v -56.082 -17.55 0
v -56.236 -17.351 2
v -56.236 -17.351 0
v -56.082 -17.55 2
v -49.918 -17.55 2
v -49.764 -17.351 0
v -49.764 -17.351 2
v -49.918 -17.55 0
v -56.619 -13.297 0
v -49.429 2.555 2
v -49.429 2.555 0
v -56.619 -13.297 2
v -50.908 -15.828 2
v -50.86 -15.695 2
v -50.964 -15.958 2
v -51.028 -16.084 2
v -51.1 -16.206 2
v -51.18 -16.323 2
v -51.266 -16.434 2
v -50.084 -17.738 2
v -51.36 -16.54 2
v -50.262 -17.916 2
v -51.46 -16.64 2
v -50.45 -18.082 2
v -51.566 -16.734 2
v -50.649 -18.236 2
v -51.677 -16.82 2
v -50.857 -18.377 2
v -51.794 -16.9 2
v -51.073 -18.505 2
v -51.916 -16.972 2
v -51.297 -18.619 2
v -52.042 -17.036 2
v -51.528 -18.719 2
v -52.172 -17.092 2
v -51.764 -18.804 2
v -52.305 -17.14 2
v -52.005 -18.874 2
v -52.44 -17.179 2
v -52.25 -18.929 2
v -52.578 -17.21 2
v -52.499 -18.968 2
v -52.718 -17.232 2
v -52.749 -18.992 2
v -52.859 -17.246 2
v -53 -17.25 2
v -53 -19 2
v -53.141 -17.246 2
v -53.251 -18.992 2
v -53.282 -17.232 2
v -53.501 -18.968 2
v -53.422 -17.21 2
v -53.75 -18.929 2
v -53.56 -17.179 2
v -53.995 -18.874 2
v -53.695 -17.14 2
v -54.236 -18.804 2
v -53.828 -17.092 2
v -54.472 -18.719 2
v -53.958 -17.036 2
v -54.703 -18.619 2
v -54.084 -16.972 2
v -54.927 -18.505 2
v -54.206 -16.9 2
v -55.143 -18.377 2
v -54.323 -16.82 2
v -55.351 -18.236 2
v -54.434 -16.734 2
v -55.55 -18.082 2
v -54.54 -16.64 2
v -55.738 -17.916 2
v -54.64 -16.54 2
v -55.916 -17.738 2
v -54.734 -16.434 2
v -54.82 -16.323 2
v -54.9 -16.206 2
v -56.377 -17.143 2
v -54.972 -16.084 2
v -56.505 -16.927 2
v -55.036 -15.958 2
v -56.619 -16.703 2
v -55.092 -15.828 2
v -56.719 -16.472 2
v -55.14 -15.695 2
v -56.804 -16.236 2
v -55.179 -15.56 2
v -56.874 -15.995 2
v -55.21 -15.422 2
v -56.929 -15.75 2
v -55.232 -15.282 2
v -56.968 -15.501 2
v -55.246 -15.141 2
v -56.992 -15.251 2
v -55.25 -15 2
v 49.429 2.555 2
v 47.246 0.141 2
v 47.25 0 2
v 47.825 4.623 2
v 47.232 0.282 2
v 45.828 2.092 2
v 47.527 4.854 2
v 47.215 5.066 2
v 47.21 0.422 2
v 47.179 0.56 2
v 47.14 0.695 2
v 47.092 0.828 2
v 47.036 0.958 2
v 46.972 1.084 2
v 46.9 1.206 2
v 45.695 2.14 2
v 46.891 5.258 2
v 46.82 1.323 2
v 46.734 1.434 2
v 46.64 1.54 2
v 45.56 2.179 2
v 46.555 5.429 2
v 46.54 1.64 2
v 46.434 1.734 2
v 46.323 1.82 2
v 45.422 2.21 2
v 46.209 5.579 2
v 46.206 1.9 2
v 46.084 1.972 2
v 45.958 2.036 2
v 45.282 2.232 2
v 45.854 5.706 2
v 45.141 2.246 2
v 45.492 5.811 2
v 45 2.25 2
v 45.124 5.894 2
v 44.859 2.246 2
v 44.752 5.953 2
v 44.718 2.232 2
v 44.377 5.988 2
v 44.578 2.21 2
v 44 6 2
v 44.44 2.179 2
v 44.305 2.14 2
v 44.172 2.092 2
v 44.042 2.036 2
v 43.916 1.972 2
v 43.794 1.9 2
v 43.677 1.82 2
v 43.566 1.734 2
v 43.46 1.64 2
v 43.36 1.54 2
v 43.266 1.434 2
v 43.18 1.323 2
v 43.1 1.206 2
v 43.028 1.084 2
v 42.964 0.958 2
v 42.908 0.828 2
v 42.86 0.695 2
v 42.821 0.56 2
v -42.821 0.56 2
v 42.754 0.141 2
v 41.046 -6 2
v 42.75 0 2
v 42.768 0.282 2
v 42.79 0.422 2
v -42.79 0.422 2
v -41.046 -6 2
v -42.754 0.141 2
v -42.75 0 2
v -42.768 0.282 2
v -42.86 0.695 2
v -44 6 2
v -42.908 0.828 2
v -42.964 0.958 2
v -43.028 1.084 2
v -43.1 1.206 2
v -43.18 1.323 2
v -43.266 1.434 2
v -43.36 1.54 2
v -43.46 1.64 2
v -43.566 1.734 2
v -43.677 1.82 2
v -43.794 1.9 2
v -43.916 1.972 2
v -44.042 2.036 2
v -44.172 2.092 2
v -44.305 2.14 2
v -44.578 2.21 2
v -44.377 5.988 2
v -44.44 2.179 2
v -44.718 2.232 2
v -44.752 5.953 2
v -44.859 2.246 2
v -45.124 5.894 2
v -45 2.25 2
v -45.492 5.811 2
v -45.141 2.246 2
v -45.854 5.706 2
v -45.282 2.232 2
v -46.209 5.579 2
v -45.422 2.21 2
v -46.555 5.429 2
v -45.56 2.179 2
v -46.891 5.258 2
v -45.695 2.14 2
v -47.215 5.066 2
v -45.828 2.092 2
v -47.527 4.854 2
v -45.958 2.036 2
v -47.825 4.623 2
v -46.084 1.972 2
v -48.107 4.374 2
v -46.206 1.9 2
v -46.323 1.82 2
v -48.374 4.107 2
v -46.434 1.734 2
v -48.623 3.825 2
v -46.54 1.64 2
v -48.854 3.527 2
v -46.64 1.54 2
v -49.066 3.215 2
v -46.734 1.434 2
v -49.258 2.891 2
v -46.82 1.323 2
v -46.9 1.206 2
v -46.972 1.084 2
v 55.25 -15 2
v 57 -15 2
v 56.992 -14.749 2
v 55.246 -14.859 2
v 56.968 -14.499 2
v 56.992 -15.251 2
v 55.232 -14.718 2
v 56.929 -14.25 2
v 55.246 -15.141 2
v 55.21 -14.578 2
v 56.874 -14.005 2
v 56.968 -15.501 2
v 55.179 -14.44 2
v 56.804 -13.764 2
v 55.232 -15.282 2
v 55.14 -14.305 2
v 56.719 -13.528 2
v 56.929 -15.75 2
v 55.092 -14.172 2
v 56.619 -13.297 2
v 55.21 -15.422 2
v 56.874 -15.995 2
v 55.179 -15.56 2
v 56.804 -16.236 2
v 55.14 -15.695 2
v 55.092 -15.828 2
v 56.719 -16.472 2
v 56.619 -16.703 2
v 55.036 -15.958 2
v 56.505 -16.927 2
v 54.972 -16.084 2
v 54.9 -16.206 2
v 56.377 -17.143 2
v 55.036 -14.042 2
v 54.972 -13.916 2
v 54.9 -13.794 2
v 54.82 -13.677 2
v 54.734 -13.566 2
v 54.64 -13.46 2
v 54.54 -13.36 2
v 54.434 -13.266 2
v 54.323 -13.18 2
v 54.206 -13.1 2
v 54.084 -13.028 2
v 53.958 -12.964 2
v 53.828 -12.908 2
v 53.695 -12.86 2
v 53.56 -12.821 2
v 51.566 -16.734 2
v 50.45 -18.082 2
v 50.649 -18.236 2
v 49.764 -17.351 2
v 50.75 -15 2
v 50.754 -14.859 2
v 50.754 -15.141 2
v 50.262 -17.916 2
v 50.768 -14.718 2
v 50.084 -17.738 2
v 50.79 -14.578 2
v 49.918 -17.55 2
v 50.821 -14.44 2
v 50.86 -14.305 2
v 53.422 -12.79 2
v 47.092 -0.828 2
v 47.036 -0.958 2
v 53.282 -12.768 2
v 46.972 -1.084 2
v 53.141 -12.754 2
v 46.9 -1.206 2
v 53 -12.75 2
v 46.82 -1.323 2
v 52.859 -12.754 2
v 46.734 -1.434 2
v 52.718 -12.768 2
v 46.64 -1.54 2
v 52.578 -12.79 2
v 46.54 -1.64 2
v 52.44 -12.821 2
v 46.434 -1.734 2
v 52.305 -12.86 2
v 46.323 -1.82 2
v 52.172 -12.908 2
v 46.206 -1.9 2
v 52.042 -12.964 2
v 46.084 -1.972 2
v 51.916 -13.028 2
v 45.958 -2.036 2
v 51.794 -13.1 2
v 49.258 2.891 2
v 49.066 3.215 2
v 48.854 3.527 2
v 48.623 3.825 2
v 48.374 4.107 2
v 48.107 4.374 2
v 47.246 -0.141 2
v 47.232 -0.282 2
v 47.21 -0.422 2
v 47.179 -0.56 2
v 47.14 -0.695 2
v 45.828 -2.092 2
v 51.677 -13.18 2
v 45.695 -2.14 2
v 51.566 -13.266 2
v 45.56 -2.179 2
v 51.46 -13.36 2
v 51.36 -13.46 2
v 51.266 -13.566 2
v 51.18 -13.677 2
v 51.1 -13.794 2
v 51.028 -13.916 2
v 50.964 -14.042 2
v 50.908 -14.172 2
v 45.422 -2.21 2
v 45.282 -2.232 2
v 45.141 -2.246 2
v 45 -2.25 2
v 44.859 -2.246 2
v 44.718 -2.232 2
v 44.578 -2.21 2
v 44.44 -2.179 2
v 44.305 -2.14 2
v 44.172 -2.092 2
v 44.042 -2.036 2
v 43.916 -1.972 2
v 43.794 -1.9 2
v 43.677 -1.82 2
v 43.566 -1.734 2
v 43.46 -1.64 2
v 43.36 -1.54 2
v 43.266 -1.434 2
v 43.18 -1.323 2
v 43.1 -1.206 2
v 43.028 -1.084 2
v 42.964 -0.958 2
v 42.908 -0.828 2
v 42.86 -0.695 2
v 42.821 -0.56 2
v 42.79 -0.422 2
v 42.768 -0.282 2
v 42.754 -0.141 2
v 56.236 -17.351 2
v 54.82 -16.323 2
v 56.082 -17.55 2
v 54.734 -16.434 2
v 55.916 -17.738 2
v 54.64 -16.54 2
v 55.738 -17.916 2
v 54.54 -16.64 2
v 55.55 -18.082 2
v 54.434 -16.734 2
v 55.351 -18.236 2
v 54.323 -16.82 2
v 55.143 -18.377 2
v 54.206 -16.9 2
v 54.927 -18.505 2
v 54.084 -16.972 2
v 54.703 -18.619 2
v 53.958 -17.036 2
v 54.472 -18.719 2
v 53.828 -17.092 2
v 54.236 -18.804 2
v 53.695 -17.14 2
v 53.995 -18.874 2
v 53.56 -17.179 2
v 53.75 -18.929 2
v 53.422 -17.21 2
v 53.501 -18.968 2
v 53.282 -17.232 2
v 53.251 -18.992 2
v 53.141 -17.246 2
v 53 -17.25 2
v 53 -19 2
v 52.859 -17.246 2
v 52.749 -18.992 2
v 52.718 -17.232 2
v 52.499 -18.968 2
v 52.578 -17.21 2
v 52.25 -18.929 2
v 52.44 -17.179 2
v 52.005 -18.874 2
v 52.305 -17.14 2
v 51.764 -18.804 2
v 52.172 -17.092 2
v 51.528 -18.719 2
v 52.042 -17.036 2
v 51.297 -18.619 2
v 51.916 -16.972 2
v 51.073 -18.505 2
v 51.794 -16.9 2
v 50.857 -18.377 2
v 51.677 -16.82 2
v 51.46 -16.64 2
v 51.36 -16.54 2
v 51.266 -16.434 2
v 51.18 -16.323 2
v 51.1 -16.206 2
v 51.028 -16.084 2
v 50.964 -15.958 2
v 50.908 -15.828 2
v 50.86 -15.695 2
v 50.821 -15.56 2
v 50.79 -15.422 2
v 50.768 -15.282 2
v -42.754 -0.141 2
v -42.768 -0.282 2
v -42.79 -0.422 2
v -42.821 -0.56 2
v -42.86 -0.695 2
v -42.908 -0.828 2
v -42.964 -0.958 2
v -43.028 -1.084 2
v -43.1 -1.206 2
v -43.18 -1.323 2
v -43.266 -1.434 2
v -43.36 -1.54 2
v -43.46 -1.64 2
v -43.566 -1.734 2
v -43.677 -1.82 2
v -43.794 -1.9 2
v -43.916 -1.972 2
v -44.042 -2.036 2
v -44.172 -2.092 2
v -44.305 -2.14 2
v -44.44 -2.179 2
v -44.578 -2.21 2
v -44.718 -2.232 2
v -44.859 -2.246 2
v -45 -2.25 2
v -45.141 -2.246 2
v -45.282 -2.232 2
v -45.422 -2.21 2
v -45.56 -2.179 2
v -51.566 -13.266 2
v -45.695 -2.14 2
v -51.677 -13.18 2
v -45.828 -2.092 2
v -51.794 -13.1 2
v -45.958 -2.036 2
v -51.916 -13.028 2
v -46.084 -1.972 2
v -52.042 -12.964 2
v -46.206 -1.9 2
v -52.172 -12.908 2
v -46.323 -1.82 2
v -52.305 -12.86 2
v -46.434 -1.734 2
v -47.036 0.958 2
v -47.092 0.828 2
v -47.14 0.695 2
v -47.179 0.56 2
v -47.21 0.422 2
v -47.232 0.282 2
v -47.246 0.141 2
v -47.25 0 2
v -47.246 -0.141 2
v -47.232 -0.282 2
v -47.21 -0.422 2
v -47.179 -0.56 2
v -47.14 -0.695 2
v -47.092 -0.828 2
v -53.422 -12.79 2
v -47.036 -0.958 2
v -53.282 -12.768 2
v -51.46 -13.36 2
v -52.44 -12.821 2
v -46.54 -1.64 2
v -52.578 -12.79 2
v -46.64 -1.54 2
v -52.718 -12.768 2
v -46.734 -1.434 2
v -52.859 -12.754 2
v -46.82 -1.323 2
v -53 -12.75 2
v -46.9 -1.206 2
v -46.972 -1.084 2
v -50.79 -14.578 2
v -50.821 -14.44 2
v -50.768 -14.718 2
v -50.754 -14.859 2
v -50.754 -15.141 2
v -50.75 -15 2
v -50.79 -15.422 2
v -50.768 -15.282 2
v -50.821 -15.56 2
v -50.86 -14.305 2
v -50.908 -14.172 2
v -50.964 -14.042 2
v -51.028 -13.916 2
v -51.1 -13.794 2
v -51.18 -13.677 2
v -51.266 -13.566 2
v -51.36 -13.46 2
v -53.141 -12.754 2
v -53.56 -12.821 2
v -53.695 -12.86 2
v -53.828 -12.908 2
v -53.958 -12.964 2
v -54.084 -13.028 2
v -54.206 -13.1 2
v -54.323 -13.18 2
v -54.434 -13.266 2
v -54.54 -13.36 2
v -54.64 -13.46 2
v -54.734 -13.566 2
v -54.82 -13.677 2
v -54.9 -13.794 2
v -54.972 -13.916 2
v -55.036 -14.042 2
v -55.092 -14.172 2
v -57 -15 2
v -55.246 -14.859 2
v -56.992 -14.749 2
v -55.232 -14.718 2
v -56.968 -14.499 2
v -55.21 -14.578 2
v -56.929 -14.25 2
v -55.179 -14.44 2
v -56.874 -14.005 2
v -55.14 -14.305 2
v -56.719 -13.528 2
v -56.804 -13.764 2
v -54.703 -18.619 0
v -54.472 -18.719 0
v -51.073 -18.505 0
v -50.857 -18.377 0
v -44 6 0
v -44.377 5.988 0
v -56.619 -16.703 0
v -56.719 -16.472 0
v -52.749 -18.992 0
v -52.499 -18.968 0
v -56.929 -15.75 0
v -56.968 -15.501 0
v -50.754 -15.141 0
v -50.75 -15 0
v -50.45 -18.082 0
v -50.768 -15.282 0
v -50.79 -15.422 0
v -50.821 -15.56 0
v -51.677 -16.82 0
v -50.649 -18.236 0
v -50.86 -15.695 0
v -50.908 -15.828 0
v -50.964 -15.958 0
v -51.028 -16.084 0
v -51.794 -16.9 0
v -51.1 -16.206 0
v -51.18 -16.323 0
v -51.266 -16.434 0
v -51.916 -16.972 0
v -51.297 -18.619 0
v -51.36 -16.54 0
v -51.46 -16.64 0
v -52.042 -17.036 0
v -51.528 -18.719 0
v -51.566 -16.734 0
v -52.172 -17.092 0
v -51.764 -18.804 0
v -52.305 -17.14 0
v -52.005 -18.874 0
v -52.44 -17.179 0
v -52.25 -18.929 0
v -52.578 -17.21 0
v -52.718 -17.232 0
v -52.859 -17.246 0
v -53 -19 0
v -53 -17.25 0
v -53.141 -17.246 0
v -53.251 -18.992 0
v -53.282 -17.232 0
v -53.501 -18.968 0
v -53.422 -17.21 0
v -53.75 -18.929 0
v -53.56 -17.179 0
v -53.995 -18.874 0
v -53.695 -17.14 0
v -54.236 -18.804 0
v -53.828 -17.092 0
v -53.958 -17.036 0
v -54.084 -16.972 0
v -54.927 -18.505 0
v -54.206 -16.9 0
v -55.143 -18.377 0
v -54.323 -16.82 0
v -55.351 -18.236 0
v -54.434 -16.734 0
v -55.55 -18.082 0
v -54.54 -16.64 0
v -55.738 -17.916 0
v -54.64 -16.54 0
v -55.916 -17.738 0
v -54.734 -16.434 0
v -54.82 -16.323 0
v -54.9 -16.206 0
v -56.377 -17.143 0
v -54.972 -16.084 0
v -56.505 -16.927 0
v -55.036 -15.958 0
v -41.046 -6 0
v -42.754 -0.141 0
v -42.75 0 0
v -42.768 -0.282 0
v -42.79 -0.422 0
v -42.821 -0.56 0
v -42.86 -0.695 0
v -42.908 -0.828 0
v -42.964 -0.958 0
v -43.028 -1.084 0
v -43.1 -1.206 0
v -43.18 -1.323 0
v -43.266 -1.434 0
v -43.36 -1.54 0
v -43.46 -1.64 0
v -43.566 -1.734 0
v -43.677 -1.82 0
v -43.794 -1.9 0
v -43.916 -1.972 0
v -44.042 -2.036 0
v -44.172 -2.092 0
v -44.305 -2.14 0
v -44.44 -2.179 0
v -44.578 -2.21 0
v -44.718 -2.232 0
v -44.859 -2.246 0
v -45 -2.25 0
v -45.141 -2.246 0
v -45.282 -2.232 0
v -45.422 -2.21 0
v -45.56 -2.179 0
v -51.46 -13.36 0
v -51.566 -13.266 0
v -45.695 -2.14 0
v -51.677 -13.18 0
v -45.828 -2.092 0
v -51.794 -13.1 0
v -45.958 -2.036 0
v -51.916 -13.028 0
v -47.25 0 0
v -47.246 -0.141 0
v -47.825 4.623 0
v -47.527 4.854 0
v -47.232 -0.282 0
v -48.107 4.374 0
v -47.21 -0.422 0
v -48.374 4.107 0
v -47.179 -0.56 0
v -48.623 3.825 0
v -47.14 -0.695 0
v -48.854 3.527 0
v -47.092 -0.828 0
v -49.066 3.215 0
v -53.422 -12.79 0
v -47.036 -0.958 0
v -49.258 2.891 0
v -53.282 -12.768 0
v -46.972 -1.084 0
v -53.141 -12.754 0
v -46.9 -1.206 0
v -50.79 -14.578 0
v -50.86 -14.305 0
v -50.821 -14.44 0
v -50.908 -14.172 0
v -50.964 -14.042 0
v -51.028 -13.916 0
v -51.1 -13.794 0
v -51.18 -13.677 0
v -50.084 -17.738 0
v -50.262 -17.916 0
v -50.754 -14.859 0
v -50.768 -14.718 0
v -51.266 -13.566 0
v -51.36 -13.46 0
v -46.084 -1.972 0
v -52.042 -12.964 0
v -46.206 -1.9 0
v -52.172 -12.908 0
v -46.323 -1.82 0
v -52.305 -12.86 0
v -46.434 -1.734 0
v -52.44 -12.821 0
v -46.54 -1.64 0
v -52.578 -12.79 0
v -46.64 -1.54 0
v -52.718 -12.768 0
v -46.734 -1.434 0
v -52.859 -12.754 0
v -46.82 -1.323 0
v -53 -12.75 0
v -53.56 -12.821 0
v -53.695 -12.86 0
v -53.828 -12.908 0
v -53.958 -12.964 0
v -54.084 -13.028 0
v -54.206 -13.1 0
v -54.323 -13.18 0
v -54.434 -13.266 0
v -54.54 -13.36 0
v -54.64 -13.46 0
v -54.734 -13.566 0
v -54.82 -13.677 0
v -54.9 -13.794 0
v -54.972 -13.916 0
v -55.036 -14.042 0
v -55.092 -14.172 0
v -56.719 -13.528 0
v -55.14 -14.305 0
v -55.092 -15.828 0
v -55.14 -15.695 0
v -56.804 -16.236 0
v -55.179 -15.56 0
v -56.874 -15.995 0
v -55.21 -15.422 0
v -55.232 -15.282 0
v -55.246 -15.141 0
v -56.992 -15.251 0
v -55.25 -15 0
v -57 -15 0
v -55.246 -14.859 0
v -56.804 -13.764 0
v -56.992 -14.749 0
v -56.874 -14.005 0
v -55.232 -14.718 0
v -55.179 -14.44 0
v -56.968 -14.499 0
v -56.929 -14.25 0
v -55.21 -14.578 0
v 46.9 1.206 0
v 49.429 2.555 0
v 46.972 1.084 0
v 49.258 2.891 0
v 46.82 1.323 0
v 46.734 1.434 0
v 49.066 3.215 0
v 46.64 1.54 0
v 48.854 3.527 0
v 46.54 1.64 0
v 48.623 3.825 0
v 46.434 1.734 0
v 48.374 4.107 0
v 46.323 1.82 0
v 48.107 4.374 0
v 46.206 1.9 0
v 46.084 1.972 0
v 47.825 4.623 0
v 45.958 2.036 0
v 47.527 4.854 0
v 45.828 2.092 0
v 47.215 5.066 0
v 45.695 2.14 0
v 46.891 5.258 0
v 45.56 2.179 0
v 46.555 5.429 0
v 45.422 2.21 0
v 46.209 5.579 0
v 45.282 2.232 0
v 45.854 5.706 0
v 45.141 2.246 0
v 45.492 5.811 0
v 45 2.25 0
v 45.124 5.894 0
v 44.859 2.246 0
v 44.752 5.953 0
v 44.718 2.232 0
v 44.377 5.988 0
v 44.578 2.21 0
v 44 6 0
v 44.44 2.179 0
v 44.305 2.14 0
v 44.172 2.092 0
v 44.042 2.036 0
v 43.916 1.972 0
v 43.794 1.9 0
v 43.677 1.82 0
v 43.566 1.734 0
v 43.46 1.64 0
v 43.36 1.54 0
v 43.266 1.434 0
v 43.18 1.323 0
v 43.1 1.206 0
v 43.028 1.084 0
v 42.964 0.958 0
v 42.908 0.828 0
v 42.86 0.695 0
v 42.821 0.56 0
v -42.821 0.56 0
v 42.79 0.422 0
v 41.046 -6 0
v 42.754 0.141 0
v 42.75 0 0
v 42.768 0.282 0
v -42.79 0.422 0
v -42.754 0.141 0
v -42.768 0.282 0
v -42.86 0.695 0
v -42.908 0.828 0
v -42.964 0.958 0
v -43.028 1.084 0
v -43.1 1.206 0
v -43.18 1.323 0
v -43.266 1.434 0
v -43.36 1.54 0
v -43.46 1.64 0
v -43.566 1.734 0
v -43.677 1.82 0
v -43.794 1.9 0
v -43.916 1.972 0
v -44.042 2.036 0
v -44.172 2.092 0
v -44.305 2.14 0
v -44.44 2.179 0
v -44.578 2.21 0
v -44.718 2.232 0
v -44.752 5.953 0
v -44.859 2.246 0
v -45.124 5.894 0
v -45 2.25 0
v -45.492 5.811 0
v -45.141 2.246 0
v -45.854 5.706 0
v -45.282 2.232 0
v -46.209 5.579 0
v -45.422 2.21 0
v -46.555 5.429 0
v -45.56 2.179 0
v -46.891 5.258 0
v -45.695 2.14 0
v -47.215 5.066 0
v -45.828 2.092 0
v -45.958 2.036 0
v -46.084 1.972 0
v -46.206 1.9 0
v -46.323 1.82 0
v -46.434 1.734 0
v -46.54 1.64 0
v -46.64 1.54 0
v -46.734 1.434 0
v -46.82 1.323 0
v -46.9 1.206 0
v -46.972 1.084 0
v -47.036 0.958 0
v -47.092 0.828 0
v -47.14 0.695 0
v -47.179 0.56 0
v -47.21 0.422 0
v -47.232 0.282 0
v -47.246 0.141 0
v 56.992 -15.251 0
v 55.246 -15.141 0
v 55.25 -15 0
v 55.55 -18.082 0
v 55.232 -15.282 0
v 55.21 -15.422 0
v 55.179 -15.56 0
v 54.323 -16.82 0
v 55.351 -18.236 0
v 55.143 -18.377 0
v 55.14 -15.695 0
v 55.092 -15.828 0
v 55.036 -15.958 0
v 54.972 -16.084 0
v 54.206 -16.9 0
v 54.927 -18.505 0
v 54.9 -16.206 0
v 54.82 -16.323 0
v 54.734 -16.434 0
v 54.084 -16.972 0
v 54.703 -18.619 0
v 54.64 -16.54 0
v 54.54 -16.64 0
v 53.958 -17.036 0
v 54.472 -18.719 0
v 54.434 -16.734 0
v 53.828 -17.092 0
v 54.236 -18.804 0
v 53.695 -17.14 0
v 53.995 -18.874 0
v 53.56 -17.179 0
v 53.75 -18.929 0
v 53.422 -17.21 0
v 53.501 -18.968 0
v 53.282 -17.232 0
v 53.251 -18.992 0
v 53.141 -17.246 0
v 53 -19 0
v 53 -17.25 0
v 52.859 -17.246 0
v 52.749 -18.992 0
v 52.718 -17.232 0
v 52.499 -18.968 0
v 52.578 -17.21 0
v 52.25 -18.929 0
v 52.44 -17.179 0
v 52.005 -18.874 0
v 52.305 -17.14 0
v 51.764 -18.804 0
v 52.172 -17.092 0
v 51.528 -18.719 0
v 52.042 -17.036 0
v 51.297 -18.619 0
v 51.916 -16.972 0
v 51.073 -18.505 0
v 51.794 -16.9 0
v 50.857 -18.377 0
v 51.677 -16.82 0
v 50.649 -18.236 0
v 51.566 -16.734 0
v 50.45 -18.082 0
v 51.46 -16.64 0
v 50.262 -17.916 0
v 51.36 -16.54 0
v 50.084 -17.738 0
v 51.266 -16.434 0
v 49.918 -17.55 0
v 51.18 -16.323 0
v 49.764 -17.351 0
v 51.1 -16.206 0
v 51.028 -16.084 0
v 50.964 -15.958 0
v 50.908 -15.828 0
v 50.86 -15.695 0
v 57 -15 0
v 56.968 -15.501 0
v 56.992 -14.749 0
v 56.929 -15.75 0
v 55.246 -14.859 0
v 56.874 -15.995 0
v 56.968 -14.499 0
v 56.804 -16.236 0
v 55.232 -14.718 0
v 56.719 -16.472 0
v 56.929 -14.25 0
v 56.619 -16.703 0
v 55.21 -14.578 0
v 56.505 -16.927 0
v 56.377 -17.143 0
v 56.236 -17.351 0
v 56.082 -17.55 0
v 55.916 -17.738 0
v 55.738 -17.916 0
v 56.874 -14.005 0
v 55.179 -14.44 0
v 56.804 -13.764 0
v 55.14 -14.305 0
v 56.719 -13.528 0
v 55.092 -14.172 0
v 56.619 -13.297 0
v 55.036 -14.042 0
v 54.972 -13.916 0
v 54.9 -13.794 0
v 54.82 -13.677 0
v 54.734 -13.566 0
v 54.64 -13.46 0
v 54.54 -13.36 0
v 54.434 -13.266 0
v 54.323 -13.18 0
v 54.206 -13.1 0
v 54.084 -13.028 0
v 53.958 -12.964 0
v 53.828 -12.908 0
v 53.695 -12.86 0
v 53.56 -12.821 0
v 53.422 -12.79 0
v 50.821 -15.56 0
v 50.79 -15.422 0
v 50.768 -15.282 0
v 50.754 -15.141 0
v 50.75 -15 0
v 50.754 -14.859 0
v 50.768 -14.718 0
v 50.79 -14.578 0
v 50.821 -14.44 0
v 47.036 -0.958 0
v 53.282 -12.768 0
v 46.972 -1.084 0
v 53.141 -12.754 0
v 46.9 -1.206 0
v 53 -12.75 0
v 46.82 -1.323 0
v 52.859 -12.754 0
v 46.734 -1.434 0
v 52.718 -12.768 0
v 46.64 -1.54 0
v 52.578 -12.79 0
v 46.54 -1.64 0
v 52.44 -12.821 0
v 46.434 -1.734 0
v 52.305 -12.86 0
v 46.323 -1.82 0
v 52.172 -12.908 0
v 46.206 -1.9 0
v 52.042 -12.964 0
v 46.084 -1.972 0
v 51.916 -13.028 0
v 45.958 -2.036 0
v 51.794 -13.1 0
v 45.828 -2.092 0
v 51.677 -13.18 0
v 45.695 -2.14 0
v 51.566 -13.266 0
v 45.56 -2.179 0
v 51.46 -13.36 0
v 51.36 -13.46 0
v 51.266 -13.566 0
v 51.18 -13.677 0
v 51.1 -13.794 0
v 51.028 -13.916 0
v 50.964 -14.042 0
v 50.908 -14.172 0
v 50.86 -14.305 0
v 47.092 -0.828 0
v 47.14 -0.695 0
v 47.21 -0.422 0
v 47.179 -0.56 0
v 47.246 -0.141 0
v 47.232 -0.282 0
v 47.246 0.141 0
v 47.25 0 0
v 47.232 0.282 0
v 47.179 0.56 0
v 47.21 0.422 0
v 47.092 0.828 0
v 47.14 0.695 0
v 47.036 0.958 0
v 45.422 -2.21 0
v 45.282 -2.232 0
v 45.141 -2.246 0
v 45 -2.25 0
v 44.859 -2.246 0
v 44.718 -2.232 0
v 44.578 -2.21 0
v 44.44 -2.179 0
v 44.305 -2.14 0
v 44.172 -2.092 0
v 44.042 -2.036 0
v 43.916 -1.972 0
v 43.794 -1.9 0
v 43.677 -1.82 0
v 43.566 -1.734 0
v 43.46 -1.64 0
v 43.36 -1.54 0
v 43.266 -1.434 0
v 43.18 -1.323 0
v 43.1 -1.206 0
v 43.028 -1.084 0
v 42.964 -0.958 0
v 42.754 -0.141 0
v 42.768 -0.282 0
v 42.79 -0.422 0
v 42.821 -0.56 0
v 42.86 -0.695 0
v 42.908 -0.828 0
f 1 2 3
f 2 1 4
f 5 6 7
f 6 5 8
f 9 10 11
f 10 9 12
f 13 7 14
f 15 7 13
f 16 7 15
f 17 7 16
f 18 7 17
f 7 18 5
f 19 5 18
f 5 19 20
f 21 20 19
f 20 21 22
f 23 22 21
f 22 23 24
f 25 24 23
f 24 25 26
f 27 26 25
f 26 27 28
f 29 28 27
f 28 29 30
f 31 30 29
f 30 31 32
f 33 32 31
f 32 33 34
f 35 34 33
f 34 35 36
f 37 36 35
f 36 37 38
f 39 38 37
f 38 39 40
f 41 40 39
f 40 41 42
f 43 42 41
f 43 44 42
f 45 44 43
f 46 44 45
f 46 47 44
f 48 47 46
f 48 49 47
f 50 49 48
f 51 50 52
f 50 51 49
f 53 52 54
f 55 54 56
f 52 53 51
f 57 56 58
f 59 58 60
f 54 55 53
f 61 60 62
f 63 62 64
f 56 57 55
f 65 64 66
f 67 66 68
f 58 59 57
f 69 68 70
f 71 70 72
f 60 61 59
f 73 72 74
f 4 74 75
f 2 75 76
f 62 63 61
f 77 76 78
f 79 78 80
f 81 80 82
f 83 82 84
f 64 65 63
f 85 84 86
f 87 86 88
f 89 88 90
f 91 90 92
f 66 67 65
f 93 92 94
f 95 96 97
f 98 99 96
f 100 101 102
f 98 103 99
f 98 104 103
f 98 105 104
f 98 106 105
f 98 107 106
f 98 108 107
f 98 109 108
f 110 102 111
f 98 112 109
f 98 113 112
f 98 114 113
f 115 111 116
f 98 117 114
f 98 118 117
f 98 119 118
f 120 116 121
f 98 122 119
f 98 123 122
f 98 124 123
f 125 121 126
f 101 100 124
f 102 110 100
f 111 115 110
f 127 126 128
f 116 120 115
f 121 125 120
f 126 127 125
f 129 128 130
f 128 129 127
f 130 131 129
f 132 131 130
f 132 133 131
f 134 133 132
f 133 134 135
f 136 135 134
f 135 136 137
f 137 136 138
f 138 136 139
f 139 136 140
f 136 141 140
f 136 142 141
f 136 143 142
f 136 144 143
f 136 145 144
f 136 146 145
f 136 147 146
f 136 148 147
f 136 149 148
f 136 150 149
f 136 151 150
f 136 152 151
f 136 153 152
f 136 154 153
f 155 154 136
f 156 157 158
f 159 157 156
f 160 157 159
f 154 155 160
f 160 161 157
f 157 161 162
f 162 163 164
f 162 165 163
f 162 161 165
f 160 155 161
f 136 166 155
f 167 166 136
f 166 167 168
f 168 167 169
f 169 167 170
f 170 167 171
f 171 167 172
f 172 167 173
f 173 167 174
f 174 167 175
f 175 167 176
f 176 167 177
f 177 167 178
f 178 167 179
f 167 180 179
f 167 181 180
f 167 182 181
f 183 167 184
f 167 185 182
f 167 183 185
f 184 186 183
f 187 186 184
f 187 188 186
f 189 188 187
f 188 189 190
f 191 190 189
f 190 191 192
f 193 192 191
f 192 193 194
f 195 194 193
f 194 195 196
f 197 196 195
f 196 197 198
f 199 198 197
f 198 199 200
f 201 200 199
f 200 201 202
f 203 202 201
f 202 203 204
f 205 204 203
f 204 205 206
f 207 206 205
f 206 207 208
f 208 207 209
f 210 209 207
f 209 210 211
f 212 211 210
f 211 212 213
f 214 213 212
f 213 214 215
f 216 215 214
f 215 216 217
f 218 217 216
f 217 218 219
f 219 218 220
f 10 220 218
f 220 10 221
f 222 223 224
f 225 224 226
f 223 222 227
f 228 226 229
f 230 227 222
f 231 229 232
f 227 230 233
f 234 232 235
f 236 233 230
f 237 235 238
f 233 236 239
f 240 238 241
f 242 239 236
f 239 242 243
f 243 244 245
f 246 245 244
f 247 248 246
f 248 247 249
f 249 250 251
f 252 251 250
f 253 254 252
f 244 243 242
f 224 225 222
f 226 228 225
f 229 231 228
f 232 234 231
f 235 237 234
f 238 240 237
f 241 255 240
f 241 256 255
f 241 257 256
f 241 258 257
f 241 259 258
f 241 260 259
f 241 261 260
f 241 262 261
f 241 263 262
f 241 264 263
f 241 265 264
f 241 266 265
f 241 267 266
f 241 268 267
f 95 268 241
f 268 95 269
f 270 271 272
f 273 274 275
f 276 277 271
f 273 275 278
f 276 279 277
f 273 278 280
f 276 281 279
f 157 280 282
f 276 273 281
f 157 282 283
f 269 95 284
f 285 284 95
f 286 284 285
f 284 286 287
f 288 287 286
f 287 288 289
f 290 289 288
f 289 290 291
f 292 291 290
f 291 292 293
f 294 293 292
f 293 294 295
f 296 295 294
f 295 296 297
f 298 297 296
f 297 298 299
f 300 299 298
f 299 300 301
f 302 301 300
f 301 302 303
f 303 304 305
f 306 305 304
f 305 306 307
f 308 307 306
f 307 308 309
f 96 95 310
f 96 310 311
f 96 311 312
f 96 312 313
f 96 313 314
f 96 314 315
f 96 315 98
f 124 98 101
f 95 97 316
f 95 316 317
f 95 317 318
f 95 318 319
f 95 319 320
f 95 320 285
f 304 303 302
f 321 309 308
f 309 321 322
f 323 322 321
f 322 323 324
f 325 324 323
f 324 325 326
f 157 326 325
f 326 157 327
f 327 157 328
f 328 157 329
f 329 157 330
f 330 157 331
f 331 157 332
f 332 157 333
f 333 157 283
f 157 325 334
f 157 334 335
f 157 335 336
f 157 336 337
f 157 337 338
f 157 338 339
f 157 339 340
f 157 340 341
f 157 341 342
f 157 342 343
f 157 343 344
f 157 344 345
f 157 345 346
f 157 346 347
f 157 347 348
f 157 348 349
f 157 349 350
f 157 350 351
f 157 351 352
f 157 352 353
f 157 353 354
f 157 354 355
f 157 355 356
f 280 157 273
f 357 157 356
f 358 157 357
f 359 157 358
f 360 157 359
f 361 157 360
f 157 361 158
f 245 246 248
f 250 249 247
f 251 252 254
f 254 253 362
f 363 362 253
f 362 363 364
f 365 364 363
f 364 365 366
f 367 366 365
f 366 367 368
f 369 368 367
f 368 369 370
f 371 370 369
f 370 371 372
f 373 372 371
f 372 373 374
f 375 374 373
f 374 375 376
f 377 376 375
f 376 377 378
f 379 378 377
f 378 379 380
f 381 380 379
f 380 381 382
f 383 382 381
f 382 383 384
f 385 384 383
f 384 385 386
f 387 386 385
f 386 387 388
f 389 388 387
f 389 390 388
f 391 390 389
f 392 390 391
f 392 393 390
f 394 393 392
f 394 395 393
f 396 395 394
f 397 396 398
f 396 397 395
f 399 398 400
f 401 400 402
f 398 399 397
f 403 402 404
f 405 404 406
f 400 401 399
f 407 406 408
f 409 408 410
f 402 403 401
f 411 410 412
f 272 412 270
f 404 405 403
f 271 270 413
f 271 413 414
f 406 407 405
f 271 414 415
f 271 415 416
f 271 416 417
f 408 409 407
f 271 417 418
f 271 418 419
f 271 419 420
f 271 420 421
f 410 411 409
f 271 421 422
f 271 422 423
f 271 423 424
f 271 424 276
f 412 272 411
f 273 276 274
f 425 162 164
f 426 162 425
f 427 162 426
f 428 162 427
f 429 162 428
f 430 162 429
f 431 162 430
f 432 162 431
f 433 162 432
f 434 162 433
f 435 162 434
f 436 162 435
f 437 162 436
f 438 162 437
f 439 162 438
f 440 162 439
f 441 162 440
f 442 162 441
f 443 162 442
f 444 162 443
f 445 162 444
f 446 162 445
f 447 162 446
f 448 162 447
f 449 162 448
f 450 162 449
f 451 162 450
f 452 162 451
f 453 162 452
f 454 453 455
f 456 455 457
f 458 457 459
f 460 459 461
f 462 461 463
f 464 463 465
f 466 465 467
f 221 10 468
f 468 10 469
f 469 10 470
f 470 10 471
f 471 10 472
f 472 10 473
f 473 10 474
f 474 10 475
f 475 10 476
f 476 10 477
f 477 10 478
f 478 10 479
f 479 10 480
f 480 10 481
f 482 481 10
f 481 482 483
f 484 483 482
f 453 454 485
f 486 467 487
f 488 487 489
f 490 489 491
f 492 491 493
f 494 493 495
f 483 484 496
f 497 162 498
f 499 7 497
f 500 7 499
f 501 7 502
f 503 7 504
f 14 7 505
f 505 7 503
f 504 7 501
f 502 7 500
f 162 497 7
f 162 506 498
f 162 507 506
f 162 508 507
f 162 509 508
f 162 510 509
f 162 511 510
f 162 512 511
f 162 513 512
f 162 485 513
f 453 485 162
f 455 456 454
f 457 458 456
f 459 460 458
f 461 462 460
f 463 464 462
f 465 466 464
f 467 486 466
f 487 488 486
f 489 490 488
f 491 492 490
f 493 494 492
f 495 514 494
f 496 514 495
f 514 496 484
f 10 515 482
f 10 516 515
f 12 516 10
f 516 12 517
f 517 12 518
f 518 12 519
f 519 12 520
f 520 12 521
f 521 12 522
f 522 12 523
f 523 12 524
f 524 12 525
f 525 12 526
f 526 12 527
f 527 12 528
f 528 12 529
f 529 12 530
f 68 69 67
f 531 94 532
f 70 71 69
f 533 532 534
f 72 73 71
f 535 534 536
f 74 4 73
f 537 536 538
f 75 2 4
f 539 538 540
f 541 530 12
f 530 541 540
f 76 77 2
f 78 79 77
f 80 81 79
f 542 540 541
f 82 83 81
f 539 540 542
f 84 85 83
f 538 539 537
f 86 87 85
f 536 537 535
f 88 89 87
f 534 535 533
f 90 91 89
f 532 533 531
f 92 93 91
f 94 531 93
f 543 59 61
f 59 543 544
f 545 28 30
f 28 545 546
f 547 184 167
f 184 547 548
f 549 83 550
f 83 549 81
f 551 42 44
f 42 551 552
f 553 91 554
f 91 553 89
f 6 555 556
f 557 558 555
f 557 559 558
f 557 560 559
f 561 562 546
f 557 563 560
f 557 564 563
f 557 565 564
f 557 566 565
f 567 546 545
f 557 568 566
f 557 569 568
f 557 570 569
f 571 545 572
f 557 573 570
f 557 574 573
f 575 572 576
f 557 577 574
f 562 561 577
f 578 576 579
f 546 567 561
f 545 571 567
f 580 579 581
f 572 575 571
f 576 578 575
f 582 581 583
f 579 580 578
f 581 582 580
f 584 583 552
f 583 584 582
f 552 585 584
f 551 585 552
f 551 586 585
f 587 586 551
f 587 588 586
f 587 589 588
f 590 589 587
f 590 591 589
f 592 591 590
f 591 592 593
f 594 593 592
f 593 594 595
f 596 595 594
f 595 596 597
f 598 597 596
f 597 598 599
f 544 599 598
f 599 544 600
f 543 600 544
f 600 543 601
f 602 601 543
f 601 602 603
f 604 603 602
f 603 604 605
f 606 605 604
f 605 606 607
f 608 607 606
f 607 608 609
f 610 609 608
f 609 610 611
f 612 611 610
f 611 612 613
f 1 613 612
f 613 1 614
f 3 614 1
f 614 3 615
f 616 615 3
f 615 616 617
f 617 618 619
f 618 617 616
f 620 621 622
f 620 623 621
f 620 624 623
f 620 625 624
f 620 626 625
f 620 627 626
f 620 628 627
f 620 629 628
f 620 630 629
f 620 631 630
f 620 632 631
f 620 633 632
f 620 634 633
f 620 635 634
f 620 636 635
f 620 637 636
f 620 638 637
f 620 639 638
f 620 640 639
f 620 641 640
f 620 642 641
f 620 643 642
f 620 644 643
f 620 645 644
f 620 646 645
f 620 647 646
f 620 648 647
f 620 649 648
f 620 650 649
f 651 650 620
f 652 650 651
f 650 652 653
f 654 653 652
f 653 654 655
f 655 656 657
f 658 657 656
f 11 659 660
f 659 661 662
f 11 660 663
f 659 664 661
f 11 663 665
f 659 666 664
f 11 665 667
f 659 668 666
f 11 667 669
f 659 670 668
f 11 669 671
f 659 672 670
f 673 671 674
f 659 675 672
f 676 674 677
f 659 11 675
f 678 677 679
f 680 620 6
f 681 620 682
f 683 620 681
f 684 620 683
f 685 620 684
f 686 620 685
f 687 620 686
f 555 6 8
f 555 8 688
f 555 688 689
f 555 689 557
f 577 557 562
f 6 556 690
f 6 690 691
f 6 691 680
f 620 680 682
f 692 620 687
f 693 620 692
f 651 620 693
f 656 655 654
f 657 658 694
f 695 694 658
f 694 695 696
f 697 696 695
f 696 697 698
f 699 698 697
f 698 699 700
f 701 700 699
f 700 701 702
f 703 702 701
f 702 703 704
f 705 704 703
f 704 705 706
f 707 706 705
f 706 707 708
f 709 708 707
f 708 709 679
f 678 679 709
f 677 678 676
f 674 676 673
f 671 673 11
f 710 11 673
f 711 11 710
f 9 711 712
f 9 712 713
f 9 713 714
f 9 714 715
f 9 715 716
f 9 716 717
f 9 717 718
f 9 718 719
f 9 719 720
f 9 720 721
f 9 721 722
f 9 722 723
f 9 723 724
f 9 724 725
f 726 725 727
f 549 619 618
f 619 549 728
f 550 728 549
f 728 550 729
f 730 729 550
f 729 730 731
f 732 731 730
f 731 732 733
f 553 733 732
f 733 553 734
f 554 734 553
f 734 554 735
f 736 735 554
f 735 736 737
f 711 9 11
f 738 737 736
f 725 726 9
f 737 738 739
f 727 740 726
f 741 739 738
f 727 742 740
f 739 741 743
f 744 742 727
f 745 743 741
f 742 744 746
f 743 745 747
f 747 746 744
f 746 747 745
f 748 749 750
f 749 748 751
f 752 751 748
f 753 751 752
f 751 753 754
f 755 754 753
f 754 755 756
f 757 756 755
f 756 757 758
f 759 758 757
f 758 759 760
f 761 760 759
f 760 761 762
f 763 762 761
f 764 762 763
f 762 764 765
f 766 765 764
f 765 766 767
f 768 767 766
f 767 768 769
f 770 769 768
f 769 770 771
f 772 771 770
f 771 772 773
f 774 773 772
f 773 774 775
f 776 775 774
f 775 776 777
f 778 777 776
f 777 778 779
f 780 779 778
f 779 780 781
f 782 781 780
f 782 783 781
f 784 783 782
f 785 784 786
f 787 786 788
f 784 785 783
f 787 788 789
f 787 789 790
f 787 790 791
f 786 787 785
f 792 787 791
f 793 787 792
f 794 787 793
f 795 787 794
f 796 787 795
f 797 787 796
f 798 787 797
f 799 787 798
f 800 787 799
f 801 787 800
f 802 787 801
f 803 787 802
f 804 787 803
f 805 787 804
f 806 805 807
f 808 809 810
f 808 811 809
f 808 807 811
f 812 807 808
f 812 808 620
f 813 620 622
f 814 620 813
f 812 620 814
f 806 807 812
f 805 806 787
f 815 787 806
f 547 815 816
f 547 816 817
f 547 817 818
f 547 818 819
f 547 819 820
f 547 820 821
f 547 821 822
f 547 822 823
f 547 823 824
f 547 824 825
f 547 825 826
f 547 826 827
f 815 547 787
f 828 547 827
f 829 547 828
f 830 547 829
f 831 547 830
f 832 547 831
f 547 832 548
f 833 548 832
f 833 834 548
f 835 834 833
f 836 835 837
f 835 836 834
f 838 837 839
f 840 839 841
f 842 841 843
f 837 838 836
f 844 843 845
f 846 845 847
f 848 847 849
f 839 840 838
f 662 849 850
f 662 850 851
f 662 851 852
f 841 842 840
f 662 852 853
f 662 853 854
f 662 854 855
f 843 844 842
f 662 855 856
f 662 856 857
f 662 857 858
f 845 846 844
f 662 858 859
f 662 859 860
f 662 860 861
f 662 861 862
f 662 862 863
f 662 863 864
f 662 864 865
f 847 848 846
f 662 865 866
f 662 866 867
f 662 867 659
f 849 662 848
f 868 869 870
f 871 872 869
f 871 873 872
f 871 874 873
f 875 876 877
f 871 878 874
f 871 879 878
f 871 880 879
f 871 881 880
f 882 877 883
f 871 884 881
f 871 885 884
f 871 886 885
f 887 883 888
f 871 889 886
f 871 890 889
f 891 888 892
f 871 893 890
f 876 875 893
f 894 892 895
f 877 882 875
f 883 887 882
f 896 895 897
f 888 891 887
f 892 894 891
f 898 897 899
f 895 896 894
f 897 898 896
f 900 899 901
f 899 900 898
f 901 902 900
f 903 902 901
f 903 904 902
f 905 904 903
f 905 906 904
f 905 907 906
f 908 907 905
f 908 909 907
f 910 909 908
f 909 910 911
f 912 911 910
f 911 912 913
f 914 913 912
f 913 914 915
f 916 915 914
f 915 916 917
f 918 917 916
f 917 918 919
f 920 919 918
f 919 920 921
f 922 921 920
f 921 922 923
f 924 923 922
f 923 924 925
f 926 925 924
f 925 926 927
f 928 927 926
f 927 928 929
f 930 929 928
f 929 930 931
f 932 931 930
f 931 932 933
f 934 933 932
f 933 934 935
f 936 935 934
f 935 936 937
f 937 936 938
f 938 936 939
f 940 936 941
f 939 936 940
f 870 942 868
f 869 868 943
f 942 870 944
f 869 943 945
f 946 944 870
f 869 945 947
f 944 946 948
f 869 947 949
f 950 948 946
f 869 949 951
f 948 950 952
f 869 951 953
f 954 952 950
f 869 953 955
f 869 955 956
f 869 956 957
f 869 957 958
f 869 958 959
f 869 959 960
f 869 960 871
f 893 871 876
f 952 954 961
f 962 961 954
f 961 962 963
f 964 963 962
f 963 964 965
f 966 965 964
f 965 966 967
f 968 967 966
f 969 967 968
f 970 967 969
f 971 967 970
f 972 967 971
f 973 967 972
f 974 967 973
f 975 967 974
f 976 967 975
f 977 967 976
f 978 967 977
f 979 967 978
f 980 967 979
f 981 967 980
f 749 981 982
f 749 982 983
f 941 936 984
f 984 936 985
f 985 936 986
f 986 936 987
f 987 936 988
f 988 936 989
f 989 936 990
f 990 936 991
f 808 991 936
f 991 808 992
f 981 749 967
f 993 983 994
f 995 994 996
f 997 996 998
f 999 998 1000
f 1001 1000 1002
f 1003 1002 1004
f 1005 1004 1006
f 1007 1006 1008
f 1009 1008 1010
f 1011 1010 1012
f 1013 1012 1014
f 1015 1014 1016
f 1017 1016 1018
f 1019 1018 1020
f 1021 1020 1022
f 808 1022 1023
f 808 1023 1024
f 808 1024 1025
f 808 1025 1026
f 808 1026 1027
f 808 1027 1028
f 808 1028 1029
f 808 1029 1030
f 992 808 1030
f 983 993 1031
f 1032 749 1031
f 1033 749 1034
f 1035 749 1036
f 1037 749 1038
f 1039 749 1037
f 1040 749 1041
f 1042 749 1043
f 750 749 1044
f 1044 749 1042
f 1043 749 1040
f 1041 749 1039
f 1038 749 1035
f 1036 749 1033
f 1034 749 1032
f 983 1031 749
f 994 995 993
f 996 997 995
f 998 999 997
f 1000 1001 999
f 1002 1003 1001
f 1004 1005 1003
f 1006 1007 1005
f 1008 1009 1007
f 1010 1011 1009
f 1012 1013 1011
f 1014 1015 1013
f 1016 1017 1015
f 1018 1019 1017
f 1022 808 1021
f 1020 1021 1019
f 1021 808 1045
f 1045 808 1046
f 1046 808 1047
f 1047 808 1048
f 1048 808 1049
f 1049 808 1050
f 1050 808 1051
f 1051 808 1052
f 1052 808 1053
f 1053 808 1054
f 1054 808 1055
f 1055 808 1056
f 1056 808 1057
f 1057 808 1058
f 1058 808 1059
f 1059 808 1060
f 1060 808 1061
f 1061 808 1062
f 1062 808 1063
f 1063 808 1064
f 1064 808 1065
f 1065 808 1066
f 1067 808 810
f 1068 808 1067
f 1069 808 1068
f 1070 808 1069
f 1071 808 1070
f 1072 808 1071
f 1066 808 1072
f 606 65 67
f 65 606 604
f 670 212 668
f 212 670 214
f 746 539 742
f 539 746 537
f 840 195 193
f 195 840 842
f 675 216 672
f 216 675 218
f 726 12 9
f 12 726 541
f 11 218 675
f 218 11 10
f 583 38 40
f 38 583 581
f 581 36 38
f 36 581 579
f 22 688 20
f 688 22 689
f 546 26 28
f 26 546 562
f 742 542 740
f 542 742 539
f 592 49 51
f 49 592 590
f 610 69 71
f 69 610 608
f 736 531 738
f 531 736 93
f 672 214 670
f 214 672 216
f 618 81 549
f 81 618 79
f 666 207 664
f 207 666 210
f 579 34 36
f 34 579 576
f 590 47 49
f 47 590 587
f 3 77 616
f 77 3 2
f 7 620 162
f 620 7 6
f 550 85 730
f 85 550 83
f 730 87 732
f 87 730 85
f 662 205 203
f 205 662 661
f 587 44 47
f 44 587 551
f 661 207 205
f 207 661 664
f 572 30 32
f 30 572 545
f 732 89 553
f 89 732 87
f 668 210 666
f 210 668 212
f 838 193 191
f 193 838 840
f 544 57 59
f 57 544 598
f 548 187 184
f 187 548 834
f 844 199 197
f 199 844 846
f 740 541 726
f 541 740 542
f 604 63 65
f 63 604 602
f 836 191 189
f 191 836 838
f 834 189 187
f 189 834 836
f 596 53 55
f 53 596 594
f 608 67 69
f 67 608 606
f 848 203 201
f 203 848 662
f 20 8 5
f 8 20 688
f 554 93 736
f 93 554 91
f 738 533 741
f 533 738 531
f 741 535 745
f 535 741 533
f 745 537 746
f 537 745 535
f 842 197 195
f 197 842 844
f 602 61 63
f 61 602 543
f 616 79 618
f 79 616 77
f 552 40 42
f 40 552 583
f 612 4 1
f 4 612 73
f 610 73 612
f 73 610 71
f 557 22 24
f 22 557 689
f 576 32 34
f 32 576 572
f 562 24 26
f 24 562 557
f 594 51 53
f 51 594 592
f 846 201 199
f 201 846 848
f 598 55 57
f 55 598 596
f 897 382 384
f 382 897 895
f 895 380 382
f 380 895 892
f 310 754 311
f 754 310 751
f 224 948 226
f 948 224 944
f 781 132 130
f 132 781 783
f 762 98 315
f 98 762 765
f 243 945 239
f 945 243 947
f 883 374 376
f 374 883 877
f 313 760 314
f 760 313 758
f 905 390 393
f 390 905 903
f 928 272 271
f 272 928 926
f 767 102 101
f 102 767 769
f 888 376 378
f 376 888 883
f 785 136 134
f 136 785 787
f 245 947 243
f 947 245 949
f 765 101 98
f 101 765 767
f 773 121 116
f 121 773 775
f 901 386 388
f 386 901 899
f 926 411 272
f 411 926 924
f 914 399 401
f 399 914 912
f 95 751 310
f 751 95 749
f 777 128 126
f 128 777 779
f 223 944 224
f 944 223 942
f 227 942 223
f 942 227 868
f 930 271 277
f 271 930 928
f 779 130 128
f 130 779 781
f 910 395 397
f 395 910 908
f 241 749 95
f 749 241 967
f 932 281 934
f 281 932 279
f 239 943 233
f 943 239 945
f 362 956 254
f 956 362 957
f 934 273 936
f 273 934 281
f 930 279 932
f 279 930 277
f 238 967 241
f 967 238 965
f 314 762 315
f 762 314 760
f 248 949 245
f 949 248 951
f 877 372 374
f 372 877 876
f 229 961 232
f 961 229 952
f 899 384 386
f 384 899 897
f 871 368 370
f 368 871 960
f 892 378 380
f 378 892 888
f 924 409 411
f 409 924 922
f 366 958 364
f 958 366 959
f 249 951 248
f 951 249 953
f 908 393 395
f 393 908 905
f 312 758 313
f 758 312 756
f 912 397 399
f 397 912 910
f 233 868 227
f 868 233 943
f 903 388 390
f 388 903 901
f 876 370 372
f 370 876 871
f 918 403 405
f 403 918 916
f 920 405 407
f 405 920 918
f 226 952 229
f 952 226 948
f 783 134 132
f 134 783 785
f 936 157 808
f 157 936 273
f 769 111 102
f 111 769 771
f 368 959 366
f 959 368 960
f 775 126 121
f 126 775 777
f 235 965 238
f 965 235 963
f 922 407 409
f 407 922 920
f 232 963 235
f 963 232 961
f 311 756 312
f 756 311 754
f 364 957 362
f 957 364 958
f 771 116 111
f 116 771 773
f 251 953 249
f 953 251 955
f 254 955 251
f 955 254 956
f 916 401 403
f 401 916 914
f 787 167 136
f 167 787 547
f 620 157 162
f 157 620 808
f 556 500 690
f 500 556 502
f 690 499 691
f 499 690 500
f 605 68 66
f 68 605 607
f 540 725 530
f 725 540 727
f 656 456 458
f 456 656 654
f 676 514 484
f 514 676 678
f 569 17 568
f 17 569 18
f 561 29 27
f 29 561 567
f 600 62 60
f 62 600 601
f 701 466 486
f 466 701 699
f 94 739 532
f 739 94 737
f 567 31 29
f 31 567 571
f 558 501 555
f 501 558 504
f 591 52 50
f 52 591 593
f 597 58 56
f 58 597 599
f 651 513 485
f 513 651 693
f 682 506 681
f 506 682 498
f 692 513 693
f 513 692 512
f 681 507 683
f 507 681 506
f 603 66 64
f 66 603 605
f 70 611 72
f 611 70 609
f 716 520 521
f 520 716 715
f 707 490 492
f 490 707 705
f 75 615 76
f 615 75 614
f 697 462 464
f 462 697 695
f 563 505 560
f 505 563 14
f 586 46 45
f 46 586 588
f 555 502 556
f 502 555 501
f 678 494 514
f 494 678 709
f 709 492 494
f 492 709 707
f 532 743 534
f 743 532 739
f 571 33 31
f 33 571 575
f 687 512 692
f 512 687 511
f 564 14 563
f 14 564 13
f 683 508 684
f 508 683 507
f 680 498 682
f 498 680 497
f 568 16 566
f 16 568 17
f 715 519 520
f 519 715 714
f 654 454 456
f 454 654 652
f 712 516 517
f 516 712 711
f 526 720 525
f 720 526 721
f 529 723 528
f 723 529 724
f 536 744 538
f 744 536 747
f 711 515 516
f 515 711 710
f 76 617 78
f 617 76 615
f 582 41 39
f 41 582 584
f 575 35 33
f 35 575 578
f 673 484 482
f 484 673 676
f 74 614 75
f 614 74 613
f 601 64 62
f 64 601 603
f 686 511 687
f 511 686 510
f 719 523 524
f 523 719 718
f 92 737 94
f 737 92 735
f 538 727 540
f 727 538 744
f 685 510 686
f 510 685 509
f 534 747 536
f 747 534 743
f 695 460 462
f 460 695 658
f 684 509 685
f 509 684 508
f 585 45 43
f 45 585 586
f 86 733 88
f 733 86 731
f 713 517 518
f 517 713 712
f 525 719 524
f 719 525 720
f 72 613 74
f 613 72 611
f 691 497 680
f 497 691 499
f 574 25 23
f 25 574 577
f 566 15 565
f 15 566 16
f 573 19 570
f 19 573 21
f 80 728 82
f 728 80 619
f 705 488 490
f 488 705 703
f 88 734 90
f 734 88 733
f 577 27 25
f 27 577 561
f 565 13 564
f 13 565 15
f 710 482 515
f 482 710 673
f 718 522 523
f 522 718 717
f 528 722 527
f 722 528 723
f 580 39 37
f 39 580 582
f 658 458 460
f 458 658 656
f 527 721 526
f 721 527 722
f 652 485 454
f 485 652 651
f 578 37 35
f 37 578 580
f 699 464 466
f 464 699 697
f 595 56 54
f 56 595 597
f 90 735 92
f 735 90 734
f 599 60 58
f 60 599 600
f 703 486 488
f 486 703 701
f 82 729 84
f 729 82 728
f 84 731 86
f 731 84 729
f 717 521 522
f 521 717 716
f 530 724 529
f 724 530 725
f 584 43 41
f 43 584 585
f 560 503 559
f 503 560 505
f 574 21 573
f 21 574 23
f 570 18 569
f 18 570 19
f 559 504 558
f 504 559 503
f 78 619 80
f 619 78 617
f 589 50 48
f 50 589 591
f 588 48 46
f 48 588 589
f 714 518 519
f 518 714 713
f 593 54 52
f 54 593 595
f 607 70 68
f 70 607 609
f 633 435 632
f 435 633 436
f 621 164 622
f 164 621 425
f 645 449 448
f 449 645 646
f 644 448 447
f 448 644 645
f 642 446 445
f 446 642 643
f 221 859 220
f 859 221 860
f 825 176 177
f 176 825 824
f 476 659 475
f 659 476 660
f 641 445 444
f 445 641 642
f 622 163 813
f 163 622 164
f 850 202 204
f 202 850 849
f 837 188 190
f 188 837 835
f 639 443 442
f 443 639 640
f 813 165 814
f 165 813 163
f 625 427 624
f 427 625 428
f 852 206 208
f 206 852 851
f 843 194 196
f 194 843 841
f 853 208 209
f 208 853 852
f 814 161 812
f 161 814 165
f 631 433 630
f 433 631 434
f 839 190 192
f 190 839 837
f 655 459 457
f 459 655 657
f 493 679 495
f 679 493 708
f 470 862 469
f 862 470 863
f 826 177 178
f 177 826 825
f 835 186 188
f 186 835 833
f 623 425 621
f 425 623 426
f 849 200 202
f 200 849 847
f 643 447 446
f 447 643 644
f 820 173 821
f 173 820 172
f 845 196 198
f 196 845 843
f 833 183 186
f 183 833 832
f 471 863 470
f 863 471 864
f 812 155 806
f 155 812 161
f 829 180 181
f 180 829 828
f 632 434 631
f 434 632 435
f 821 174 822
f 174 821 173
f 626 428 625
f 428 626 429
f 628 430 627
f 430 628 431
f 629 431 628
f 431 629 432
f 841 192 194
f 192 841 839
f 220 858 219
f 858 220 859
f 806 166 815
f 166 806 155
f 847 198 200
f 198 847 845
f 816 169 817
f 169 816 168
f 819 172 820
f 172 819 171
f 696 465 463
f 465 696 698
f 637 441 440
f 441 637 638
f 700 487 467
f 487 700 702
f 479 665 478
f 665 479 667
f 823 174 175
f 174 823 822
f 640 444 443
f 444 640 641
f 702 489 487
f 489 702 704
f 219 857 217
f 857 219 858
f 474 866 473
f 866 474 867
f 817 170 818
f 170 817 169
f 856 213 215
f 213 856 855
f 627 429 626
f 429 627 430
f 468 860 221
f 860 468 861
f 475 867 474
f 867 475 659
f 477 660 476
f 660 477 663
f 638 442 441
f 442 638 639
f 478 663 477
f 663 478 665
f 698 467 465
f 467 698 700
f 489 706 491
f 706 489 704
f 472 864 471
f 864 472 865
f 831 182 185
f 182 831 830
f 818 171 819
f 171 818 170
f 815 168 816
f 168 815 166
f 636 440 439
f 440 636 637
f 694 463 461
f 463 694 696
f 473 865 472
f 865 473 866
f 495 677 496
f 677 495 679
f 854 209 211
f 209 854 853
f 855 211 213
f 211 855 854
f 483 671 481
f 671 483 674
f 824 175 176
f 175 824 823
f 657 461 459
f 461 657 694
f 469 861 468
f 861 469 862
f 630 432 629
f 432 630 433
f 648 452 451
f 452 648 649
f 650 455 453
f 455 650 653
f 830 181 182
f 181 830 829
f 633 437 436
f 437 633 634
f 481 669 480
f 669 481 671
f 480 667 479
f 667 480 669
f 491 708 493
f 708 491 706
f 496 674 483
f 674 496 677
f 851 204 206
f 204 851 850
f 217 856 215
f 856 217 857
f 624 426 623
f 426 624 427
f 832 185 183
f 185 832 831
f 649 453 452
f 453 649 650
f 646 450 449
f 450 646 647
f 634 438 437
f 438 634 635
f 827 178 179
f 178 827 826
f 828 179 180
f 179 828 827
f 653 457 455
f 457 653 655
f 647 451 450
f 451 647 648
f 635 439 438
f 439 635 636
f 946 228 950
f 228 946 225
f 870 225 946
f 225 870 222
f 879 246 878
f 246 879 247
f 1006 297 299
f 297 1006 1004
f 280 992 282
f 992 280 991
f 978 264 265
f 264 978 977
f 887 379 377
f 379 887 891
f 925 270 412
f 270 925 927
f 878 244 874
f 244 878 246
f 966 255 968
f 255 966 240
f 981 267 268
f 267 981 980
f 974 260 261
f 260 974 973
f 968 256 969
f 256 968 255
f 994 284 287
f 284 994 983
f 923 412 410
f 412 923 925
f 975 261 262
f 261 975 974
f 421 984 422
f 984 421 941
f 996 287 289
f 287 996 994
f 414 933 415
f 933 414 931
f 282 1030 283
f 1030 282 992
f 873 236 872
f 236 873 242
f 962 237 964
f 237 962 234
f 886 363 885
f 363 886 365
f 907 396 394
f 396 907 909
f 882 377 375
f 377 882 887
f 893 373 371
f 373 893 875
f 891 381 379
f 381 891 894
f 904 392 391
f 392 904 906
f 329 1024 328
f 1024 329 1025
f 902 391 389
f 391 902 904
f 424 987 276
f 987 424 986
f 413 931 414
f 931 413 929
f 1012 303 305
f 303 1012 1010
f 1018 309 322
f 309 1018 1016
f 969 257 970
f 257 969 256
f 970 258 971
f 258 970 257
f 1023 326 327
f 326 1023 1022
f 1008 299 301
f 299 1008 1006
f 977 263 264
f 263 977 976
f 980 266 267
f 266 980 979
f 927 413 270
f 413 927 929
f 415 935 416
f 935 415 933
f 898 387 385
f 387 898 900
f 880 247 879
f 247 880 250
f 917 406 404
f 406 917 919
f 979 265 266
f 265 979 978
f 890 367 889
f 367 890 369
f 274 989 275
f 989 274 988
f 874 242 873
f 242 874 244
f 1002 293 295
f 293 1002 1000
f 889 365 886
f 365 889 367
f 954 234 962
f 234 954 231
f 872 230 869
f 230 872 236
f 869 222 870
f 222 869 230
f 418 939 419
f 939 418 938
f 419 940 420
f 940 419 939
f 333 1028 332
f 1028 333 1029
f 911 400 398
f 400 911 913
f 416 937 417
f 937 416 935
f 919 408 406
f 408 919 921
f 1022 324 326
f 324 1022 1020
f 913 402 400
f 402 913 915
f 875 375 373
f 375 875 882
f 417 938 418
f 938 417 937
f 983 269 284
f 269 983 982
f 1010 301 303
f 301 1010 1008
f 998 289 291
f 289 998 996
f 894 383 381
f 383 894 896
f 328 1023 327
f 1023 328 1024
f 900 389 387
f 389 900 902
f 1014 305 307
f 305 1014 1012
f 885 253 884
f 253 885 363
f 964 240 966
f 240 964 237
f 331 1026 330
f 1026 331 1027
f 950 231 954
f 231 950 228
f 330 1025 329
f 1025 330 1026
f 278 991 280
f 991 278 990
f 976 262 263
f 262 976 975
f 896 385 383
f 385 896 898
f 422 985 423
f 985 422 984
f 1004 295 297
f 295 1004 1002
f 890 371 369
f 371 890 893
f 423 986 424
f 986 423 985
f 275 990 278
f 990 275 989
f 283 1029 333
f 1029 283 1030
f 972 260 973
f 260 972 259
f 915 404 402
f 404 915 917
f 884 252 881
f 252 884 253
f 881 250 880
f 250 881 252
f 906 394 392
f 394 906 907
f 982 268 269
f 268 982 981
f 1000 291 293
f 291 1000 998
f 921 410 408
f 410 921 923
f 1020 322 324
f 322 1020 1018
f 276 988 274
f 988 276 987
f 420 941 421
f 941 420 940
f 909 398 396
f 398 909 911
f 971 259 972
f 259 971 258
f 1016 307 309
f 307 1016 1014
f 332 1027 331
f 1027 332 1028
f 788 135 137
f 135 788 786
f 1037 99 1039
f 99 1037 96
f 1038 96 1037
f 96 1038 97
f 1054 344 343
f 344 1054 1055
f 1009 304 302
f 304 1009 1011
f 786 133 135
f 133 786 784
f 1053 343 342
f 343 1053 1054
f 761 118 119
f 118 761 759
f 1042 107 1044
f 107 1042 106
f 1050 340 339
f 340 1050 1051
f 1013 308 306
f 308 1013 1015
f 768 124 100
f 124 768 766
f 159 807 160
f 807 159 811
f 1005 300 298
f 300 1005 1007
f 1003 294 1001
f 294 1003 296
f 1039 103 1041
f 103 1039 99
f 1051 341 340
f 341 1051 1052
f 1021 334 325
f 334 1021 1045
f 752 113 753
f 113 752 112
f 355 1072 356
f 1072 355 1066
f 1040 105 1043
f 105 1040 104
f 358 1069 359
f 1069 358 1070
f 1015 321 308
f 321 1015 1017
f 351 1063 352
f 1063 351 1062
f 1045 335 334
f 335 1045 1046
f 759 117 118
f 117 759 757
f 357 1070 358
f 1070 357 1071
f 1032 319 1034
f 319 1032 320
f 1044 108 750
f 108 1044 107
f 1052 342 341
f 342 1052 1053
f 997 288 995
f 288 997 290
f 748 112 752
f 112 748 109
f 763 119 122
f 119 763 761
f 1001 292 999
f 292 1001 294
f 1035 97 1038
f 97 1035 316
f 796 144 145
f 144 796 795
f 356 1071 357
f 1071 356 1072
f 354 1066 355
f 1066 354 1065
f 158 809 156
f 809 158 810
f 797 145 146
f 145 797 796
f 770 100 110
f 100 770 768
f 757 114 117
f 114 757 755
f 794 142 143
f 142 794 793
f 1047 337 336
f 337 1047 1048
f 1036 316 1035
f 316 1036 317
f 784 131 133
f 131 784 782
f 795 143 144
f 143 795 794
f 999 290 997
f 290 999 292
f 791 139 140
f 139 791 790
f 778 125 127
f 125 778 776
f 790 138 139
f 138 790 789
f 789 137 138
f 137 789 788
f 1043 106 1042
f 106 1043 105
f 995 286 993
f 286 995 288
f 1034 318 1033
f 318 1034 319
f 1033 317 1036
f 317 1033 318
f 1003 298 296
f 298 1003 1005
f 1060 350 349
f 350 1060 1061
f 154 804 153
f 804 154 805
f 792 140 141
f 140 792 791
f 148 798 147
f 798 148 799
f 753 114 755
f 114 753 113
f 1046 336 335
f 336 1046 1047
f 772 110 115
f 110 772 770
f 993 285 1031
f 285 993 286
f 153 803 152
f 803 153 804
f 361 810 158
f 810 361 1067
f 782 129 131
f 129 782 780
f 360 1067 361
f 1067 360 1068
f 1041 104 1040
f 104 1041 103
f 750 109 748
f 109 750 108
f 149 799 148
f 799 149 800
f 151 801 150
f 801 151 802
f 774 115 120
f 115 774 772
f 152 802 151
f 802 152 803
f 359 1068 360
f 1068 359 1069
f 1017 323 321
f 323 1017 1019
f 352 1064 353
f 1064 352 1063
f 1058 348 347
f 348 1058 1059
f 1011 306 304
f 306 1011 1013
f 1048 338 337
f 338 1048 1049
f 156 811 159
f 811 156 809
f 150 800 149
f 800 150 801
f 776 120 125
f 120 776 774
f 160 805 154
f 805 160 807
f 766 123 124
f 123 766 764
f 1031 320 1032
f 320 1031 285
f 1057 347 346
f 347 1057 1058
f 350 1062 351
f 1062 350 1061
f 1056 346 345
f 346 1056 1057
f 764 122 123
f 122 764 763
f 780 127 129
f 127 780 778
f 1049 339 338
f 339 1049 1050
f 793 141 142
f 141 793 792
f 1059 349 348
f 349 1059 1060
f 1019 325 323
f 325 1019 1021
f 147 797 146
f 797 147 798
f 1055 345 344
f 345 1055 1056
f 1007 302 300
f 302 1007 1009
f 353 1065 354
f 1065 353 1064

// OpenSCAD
FAN1_HOLE_DIA = 4.5;
FAN1_HOLE_SPACING = 106;
FAN1_MOUNT_WIDTH = 8;

FAN2_HOLE_DIA = FAN1_HOLE_DIA;
FAN2_HOLE_SPACING = 90; // 106;
FAN2_MOUNT_WIDTH = 8;

FAN_SPACING = 15; // 39.5; // 50;
FAN_SPACING_SPLIT = 1.0; // 0.5;

THICKNESS = 2;
BAR_WIDTH = 12;
BAR_LENGTH = 100;

$fn = 100;

difference() {
  union() {
    hull() {
      translate([-(BAR_LENGTH-BAR_WIDTH)/2, 0, 0])
      cylinder(d = BAR_WIDTH, h = THICKNESS);
      translate([(BAR_LENGTH-BAR_WIDTH)/2, 0, 0])
      cylinder(d = BAR_WIDTH, h = THICKNESS);
    }

    for(i = [-1, 1]) {
      hull() {
        translate([i * FAN1_HOLE_SPACING/2, -FAN_SPACING * FAN_SPACING_SPLIT, 0])
        cylinder(d = FAN1_MOUNT_WIDTH, h = THICKNESS);
        translate([i * (BAR_LENGTH-BAR_WIDTH)/2, 0, 0])
        cylinder(d = BAR_WIDTH, h = THICKNESS);
      }
      hull() {
        translate([i * FAN2_HOLE_SPACING/2, FAN_SPACING * (1 - FAN_SPACING_SPLIT), 0])
        cylinder(d = FAN2_MOUNT_WIDTH, h = THICKNESS);
        translate([i * (BAR_LENGTH-BAR_WIDTH)/2, 0, 0])
        cylinder(d = BAR_WIDTH, h = THICKNESS);
      }
    }
  }

  #for(i = [-1, 1]) {
    translate([i * FAN1_HOLE_SPACING/2, -FAN_SPACING * FAN_SPACING_SPLIT, 0])
    cylinder(d = FAN1_HOLE_DIA, h = THICKNESS);
    translate([i * FAN2_HOLE_SPACING/2, FAN_SPACING * (1 - FAN_SPACING_SPLIT), 0])
    cylinder(d = FAN2_HOLE_DIA, h = THICKNESS);
  }
}
